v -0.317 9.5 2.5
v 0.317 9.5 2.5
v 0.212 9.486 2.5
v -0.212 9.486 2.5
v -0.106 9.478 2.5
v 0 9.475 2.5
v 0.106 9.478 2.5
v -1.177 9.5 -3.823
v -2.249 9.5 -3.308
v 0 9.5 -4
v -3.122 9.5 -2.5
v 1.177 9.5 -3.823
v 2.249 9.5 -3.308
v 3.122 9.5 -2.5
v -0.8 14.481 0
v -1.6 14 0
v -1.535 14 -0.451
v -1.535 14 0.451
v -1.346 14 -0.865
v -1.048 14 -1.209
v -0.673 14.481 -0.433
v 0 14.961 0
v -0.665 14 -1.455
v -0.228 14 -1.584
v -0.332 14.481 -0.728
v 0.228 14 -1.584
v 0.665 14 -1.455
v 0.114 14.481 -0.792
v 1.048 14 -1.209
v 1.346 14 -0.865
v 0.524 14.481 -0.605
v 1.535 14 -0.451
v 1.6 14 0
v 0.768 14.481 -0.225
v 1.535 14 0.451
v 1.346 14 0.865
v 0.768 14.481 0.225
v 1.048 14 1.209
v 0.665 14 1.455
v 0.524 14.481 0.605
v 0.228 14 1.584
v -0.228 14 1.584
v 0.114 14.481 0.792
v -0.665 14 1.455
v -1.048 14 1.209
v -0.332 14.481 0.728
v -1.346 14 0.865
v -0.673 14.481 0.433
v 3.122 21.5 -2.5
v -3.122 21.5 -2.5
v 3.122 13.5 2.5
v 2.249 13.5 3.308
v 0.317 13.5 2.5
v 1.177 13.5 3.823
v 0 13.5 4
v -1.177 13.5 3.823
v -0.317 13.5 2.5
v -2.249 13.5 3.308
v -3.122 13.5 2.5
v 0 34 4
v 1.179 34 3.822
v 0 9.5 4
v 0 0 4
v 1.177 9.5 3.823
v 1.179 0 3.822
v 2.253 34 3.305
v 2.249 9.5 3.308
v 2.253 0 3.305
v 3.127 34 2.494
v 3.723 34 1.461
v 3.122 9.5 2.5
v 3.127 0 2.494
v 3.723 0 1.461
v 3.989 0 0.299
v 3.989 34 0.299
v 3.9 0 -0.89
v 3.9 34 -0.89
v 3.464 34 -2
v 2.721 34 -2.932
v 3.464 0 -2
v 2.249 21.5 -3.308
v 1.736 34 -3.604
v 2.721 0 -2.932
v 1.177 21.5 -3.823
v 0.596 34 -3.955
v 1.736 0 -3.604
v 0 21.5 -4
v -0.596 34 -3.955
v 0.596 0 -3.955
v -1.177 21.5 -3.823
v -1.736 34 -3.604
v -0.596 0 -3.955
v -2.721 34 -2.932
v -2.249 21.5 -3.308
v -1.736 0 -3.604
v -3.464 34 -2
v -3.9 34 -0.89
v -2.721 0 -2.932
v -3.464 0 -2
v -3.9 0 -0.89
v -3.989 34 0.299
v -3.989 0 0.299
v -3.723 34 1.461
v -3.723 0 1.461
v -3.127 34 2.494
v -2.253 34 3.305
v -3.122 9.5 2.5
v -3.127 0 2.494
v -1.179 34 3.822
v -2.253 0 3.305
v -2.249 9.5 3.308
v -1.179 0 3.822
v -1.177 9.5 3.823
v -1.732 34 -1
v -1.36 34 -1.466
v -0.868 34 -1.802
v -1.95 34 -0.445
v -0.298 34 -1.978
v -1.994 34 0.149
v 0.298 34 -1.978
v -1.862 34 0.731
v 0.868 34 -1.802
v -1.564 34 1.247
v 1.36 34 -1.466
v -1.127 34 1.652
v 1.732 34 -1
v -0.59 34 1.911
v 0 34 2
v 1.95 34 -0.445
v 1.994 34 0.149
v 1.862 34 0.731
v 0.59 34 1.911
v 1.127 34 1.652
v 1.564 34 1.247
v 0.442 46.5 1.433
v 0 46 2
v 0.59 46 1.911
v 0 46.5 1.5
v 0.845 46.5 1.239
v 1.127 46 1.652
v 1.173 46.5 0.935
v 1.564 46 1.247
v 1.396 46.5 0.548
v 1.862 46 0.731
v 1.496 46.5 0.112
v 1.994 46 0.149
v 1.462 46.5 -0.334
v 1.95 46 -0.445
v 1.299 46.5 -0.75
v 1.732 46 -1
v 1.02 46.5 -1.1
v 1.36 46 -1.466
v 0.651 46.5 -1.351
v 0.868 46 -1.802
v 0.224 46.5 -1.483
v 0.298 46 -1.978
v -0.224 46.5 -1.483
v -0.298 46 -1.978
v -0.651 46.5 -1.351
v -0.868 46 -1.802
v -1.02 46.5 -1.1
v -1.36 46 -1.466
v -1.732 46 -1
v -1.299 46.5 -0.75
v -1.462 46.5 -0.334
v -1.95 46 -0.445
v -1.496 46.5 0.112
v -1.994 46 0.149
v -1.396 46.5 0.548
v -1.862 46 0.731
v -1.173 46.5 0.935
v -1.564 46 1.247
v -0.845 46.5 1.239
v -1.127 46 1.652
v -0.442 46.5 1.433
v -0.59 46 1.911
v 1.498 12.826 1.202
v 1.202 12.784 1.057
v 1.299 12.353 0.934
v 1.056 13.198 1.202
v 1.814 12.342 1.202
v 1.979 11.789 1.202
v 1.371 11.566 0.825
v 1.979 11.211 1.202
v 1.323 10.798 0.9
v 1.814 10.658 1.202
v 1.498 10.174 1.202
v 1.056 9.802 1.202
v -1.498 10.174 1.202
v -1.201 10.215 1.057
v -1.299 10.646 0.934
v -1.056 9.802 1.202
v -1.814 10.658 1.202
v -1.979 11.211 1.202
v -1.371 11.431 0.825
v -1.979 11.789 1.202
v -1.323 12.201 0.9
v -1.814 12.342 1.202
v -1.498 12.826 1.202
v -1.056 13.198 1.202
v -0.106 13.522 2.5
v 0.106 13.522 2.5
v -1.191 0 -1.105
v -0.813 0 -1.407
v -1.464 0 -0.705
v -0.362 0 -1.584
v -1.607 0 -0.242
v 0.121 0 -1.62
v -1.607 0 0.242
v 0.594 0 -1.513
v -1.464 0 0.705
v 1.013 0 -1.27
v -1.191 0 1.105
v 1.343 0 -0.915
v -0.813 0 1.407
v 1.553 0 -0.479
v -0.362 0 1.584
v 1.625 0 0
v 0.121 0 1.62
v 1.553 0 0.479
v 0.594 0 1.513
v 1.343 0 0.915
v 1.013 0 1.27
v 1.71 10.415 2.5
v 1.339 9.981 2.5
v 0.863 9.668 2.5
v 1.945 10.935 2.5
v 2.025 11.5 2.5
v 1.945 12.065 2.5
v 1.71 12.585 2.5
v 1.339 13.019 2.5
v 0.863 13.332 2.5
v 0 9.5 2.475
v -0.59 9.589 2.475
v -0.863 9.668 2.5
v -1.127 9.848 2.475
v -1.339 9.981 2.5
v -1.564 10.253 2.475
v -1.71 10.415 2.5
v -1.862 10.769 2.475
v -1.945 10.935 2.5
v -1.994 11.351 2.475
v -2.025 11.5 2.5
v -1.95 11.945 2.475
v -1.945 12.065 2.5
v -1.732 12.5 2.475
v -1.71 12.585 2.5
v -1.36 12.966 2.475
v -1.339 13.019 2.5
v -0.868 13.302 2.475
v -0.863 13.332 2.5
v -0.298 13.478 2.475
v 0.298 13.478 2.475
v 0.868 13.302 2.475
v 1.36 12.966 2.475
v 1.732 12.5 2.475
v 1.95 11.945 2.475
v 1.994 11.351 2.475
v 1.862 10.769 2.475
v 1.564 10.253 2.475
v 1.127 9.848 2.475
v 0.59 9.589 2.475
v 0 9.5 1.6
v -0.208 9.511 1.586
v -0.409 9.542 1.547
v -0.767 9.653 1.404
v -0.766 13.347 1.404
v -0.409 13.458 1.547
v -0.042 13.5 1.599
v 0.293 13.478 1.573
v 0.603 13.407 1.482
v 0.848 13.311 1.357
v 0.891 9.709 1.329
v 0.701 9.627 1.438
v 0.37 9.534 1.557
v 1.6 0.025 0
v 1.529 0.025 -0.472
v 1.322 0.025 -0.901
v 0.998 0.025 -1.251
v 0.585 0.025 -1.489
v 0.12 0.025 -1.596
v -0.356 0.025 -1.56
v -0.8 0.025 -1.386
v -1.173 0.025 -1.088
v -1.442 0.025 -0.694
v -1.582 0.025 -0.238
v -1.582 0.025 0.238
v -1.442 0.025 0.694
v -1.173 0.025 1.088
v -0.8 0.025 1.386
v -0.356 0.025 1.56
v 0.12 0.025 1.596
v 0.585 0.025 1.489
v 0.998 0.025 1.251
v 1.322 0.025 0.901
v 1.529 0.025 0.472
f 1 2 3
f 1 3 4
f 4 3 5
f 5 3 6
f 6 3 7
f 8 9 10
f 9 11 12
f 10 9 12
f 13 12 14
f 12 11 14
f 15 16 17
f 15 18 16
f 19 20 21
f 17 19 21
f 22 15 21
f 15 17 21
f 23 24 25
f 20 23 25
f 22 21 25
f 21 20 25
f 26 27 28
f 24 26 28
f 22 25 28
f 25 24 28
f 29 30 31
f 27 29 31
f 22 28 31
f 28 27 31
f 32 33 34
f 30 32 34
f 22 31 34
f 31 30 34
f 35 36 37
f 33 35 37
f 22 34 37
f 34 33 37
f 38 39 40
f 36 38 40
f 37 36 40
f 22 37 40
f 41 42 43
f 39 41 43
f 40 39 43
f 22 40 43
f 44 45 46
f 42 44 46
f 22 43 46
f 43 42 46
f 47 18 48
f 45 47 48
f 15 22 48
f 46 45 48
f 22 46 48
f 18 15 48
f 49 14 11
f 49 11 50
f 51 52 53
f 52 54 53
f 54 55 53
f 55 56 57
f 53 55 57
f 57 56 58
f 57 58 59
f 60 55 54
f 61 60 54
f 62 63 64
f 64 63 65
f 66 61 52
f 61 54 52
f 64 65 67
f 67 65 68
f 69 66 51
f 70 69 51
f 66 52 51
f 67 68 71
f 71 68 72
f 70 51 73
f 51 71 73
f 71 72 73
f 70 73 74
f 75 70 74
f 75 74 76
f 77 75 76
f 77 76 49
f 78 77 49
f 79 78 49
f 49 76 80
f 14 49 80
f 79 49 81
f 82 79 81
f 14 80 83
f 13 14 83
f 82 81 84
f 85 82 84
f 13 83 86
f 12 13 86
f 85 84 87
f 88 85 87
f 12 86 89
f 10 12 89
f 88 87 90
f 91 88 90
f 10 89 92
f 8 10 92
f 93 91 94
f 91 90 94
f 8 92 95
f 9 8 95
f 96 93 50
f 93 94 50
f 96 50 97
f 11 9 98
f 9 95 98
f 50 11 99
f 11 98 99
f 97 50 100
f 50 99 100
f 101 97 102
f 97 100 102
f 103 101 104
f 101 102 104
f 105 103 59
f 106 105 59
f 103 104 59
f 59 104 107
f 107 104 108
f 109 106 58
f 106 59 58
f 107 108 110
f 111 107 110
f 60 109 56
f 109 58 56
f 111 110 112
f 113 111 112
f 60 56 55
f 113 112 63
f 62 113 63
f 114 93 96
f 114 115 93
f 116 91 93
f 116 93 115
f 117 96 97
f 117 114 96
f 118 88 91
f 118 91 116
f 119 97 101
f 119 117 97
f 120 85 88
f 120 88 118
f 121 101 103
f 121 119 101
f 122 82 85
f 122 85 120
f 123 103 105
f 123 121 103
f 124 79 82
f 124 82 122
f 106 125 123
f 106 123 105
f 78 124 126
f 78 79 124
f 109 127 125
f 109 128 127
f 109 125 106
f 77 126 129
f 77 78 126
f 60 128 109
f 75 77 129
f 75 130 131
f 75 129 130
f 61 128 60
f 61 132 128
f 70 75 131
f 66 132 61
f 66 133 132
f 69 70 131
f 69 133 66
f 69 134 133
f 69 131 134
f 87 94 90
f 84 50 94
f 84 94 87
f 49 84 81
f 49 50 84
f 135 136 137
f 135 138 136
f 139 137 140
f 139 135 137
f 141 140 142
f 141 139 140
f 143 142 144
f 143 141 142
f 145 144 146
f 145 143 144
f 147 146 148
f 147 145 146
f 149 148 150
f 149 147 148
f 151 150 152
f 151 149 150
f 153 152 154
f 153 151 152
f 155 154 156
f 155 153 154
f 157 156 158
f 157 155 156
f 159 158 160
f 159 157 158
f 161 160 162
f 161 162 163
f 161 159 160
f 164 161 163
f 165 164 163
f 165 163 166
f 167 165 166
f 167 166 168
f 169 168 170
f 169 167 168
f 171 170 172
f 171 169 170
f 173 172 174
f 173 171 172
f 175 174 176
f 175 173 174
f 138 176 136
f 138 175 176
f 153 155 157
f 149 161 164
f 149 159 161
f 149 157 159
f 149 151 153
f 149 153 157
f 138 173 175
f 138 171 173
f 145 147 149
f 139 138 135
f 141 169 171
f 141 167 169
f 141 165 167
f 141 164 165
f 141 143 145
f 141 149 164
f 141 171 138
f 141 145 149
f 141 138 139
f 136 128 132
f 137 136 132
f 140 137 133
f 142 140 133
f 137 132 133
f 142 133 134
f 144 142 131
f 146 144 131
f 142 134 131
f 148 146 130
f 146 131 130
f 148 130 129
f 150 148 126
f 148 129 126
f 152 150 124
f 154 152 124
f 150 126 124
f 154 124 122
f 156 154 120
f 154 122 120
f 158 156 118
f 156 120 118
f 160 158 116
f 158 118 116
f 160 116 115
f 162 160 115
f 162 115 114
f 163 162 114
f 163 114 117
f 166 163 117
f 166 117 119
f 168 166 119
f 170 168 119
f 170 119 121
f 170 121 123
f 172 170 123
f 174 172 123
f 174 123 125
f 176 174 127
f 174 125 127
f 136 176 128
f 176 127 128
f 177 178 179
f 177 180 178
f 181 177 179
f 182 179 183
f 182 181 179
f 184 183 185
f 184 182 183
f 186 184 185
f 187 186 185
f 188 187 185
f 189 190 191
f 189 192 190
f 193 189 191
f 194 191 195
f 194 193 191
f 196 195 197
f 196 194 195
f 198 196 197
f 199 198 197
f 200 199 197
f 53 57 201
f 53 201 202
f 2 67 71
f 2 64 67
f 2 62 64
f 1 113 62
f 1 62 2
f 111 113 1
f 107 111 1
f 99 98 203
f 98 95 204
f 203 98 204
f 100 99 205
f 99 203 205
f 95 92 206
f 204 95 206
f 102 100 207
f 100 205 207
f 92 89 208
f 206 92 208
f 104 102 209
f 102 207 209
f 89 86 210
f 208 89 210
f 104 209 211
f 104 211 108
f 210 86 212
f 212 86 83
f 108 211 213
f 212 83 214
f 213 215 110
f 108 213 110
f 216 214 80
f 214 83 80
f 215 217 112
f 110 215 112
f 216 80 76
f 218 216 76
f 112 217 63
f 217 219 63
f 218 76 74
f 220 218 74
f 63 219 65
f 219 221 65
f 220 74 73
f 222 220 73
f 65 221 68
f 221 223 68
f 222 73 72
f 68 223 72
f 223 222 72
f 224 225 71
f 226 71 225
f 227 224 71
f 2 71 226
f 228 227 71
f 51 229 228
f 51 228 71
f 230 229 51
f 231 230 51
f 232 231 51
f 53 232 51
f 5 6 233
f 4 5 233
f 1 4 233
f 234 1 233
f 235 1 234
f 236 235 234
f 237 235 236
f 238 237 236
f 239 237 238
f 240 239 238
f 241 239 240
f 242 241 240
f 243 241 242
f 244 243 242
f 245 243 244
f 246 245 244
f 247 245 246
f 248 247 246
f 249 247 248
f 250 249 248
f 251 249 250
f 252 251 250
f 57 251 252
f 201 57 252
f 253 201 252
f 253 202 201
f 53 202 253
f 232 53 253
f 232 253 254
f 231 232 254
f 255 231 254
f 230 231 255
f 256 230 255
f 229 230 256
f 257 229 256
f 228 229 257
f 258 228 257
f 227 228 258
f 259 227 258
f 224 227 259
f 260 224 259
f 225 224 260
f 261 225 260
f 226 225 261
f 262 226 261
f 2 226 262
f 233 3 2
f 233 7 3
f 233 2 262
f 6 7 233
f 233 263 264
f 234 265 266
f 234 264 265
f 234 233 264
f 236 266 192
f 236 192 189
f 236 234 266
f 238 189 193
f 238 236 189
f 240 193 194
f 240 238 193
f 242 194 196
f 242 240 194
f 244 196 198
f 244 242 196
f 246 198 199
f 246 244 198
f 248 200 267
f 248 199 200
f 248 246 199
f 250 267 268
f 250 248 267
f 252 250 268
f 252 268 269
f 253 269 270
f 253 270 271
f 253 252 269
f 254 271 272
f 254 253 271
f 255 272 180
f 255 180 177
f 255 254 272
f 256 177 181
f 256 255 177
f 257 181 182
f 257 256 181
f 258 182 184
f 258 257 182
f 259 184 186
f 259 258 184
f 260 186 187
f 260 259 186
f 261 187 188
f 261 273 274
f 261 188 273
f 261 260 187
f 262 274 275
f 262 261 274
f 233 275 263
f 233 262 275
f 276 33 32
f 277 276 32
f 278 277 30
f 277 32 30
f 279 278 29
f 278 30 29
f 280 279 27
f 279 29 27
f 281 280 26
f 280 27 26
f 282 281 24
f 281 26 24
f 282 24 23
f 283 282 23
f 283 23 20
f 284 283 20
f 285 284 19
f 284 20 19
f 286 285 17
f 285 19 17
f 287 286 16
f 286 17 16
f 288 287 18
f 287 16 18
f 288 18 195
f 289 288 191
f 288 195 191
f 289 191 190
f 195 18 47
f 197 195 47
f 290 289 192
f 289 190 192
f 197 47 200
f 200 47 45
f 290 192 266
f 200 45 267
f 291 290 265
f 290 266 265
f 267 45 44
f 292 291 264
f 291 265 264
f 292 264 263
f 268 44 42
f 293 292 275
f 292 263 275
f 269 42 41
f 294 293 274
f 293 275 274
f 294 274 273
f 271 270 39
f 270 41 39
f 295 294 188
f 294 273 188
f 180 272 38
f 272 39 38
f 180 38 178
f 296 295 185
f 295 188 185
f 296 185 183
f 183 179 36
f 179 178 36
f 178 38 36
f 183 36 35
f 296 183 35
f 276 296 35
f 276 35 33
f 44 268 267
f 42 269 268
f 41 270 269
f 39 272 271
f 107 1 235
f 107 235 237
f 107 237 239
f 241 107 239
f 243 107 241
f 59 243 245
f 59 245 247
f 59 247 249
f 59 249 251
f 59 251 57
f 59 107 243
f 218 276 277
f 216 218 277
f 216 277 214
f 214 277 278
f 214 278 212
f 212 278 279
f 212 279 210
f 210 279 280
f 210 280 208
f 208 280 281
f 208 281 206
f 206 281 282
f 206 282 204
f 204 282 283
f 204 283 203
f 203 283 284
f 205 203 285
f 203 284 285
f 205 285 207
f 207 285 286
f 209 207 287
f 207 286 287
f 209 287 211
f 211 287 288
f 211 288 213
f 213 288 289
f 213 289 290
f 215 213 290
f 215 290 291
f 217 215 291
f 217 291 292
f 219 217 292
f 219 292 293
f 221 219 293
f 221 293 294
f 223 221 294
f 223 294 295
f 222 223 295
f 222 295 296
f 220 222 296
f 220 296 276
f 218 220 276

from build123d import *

# Parameters (mm, degrees)
SKETCH1_R                            = 4
BOSS_EXTRUDE1_DEPTH                  = 34
F_3_2_3_2_DIAMETER_HOLE3_D           = 3.2
F_3_2_3_2_DIAMETER_HOLE3_DEPTH       = 14
F_3_2_3_2_DIAMETER_HOLE3_CSINK_D     = 3.25
F_3_2_3_2_DIAMETER_HOLE3_CSINK_ANGLE = 90
F_3_2_3_2_DIAMETER_HOLE3_TIP         = 0.96137699
SKETCH4_W                            = 3
SKETCH4_H                            = 4
SKETCH4_H_2                          = 12
CUT_EXTRUDE1_DEPTH                   = 4
SKETCH8_R                            = 2
BOSS_EXTRUDE2_DEPTH                  = 12
SKETCH9_R                            = 2
BOSS_EXTRUDE3_DEPTH                  = 0.5
BOSS_EXTRUDE3_TAPER                  = 45


with BuildPart() as part:
    # Sketch1 → Boss-Extrude1 (new body)
    with BuildSketch(Plane(origin=(0, 0, 0), x_dir=(1, 0, 0), z_dir=(0, 1, 0))):
        with Locations(Location((0, 0, 0), (0, 0, 270))):
            Circle(SKETCH1_R)
    extrude(amount=BOSS_EXTRUDE1_DEPTH)

    # Ø3.2 (3.2) Diameter Hole3
    with Locations(Plane(origin=(0, 0, 0), x_dir=(-1, 0, 0), z_dir=(0, -1, 0))):
        with Locations((0, 0)):
            CounterSinkHole(F_3_2_3_2_DIAMETER_HOLE3_D / 2, F_3_2_3_2_DIAMETER_HOLE3_CSINK_D / 2, depth=F_3_2_3_2_DIAMETER_HOLE3_DEPTH, counter_sink_angle=F_3_2_3_2_DIAMETER_HOLE3_CSINK_ANGLE)
            with Locations((0, 0, -(F_3_2_3_2_DIAMETER_HOLE3_DEPTH + F_3_2_3_2_DIAMETER_HOLE3_TIP / 2))):  # 118° drill point
                Cone(0, F_3_2_3_2_DIAMETER_HOLE3_D / 2, F_3_2_3_2_DIAMETER_HOLE3_TIP, mode=Mode.SUBTRACT)

    # Sketch4 → Cut-Extrude1 (cut, symmetric)
    with BuildSketch(Plane(origin=(0, 0, 0), x_dir=(0, 0, -1), z_dir=(1, 0, 0))):
        with Locations((-4, 11.5)):
            Rectangle(SKETCH4_W, SKETCH4_H)
        with Locations((4, 15.5)):
            Rectangle(SKETCH4_W, SKETCH4_H_2)
    extrude(amount=CUT_EXTRUDE1_DEPTH, both=True, mode=Mode.SUBTRACT)

    # Sketch6 → Ø4.0 (4) Diameter Hole2 (revolve, cut)
    with BuildSketch(Plane(origin=(0, 11.5, 2.5), x_dir=(0, -1, 0), z_dir=(1, 0, 0))):
        Polygon((0, 0), (0, 2.5), (2, 1.298278762), (2, 0.025), (2.025, 0), align=None)
    revolve(axis=Axis((0, 11.5, 8.85), (0, 0, -1)), mode=Mode.SUBTRACT)

    # Sketch8 → Boss-Extrude2 (add)
    with BuildSketch(Plane(origin=(0, 34, 0), x_dir=(1, 0, 0), z_dir=(0, 1, 0))):
        with Locations(Location((0, 0, 0), (0, 0, 270))):
            Circle(SKETCH8_R)
    extrude(amount=BOSS_EXTRUDE2_DEPTH)

    # Sketch9 → Boss-Extrude3 (add)
    with BuildSketch(Plane(origin=(0, 46, 0), x_dir=(1, 0, 0), z_dir=(0, 1, 0))):
        with Locations(Location((0, 0, 0), (0, 0, 270))):
            Circle(SKETCH9_R)
    extrude(amount=BOSS_EXTRUDE3_DEPTH, taper=BOSS_EXTRUDE3_TAPER)


solid = part.part
